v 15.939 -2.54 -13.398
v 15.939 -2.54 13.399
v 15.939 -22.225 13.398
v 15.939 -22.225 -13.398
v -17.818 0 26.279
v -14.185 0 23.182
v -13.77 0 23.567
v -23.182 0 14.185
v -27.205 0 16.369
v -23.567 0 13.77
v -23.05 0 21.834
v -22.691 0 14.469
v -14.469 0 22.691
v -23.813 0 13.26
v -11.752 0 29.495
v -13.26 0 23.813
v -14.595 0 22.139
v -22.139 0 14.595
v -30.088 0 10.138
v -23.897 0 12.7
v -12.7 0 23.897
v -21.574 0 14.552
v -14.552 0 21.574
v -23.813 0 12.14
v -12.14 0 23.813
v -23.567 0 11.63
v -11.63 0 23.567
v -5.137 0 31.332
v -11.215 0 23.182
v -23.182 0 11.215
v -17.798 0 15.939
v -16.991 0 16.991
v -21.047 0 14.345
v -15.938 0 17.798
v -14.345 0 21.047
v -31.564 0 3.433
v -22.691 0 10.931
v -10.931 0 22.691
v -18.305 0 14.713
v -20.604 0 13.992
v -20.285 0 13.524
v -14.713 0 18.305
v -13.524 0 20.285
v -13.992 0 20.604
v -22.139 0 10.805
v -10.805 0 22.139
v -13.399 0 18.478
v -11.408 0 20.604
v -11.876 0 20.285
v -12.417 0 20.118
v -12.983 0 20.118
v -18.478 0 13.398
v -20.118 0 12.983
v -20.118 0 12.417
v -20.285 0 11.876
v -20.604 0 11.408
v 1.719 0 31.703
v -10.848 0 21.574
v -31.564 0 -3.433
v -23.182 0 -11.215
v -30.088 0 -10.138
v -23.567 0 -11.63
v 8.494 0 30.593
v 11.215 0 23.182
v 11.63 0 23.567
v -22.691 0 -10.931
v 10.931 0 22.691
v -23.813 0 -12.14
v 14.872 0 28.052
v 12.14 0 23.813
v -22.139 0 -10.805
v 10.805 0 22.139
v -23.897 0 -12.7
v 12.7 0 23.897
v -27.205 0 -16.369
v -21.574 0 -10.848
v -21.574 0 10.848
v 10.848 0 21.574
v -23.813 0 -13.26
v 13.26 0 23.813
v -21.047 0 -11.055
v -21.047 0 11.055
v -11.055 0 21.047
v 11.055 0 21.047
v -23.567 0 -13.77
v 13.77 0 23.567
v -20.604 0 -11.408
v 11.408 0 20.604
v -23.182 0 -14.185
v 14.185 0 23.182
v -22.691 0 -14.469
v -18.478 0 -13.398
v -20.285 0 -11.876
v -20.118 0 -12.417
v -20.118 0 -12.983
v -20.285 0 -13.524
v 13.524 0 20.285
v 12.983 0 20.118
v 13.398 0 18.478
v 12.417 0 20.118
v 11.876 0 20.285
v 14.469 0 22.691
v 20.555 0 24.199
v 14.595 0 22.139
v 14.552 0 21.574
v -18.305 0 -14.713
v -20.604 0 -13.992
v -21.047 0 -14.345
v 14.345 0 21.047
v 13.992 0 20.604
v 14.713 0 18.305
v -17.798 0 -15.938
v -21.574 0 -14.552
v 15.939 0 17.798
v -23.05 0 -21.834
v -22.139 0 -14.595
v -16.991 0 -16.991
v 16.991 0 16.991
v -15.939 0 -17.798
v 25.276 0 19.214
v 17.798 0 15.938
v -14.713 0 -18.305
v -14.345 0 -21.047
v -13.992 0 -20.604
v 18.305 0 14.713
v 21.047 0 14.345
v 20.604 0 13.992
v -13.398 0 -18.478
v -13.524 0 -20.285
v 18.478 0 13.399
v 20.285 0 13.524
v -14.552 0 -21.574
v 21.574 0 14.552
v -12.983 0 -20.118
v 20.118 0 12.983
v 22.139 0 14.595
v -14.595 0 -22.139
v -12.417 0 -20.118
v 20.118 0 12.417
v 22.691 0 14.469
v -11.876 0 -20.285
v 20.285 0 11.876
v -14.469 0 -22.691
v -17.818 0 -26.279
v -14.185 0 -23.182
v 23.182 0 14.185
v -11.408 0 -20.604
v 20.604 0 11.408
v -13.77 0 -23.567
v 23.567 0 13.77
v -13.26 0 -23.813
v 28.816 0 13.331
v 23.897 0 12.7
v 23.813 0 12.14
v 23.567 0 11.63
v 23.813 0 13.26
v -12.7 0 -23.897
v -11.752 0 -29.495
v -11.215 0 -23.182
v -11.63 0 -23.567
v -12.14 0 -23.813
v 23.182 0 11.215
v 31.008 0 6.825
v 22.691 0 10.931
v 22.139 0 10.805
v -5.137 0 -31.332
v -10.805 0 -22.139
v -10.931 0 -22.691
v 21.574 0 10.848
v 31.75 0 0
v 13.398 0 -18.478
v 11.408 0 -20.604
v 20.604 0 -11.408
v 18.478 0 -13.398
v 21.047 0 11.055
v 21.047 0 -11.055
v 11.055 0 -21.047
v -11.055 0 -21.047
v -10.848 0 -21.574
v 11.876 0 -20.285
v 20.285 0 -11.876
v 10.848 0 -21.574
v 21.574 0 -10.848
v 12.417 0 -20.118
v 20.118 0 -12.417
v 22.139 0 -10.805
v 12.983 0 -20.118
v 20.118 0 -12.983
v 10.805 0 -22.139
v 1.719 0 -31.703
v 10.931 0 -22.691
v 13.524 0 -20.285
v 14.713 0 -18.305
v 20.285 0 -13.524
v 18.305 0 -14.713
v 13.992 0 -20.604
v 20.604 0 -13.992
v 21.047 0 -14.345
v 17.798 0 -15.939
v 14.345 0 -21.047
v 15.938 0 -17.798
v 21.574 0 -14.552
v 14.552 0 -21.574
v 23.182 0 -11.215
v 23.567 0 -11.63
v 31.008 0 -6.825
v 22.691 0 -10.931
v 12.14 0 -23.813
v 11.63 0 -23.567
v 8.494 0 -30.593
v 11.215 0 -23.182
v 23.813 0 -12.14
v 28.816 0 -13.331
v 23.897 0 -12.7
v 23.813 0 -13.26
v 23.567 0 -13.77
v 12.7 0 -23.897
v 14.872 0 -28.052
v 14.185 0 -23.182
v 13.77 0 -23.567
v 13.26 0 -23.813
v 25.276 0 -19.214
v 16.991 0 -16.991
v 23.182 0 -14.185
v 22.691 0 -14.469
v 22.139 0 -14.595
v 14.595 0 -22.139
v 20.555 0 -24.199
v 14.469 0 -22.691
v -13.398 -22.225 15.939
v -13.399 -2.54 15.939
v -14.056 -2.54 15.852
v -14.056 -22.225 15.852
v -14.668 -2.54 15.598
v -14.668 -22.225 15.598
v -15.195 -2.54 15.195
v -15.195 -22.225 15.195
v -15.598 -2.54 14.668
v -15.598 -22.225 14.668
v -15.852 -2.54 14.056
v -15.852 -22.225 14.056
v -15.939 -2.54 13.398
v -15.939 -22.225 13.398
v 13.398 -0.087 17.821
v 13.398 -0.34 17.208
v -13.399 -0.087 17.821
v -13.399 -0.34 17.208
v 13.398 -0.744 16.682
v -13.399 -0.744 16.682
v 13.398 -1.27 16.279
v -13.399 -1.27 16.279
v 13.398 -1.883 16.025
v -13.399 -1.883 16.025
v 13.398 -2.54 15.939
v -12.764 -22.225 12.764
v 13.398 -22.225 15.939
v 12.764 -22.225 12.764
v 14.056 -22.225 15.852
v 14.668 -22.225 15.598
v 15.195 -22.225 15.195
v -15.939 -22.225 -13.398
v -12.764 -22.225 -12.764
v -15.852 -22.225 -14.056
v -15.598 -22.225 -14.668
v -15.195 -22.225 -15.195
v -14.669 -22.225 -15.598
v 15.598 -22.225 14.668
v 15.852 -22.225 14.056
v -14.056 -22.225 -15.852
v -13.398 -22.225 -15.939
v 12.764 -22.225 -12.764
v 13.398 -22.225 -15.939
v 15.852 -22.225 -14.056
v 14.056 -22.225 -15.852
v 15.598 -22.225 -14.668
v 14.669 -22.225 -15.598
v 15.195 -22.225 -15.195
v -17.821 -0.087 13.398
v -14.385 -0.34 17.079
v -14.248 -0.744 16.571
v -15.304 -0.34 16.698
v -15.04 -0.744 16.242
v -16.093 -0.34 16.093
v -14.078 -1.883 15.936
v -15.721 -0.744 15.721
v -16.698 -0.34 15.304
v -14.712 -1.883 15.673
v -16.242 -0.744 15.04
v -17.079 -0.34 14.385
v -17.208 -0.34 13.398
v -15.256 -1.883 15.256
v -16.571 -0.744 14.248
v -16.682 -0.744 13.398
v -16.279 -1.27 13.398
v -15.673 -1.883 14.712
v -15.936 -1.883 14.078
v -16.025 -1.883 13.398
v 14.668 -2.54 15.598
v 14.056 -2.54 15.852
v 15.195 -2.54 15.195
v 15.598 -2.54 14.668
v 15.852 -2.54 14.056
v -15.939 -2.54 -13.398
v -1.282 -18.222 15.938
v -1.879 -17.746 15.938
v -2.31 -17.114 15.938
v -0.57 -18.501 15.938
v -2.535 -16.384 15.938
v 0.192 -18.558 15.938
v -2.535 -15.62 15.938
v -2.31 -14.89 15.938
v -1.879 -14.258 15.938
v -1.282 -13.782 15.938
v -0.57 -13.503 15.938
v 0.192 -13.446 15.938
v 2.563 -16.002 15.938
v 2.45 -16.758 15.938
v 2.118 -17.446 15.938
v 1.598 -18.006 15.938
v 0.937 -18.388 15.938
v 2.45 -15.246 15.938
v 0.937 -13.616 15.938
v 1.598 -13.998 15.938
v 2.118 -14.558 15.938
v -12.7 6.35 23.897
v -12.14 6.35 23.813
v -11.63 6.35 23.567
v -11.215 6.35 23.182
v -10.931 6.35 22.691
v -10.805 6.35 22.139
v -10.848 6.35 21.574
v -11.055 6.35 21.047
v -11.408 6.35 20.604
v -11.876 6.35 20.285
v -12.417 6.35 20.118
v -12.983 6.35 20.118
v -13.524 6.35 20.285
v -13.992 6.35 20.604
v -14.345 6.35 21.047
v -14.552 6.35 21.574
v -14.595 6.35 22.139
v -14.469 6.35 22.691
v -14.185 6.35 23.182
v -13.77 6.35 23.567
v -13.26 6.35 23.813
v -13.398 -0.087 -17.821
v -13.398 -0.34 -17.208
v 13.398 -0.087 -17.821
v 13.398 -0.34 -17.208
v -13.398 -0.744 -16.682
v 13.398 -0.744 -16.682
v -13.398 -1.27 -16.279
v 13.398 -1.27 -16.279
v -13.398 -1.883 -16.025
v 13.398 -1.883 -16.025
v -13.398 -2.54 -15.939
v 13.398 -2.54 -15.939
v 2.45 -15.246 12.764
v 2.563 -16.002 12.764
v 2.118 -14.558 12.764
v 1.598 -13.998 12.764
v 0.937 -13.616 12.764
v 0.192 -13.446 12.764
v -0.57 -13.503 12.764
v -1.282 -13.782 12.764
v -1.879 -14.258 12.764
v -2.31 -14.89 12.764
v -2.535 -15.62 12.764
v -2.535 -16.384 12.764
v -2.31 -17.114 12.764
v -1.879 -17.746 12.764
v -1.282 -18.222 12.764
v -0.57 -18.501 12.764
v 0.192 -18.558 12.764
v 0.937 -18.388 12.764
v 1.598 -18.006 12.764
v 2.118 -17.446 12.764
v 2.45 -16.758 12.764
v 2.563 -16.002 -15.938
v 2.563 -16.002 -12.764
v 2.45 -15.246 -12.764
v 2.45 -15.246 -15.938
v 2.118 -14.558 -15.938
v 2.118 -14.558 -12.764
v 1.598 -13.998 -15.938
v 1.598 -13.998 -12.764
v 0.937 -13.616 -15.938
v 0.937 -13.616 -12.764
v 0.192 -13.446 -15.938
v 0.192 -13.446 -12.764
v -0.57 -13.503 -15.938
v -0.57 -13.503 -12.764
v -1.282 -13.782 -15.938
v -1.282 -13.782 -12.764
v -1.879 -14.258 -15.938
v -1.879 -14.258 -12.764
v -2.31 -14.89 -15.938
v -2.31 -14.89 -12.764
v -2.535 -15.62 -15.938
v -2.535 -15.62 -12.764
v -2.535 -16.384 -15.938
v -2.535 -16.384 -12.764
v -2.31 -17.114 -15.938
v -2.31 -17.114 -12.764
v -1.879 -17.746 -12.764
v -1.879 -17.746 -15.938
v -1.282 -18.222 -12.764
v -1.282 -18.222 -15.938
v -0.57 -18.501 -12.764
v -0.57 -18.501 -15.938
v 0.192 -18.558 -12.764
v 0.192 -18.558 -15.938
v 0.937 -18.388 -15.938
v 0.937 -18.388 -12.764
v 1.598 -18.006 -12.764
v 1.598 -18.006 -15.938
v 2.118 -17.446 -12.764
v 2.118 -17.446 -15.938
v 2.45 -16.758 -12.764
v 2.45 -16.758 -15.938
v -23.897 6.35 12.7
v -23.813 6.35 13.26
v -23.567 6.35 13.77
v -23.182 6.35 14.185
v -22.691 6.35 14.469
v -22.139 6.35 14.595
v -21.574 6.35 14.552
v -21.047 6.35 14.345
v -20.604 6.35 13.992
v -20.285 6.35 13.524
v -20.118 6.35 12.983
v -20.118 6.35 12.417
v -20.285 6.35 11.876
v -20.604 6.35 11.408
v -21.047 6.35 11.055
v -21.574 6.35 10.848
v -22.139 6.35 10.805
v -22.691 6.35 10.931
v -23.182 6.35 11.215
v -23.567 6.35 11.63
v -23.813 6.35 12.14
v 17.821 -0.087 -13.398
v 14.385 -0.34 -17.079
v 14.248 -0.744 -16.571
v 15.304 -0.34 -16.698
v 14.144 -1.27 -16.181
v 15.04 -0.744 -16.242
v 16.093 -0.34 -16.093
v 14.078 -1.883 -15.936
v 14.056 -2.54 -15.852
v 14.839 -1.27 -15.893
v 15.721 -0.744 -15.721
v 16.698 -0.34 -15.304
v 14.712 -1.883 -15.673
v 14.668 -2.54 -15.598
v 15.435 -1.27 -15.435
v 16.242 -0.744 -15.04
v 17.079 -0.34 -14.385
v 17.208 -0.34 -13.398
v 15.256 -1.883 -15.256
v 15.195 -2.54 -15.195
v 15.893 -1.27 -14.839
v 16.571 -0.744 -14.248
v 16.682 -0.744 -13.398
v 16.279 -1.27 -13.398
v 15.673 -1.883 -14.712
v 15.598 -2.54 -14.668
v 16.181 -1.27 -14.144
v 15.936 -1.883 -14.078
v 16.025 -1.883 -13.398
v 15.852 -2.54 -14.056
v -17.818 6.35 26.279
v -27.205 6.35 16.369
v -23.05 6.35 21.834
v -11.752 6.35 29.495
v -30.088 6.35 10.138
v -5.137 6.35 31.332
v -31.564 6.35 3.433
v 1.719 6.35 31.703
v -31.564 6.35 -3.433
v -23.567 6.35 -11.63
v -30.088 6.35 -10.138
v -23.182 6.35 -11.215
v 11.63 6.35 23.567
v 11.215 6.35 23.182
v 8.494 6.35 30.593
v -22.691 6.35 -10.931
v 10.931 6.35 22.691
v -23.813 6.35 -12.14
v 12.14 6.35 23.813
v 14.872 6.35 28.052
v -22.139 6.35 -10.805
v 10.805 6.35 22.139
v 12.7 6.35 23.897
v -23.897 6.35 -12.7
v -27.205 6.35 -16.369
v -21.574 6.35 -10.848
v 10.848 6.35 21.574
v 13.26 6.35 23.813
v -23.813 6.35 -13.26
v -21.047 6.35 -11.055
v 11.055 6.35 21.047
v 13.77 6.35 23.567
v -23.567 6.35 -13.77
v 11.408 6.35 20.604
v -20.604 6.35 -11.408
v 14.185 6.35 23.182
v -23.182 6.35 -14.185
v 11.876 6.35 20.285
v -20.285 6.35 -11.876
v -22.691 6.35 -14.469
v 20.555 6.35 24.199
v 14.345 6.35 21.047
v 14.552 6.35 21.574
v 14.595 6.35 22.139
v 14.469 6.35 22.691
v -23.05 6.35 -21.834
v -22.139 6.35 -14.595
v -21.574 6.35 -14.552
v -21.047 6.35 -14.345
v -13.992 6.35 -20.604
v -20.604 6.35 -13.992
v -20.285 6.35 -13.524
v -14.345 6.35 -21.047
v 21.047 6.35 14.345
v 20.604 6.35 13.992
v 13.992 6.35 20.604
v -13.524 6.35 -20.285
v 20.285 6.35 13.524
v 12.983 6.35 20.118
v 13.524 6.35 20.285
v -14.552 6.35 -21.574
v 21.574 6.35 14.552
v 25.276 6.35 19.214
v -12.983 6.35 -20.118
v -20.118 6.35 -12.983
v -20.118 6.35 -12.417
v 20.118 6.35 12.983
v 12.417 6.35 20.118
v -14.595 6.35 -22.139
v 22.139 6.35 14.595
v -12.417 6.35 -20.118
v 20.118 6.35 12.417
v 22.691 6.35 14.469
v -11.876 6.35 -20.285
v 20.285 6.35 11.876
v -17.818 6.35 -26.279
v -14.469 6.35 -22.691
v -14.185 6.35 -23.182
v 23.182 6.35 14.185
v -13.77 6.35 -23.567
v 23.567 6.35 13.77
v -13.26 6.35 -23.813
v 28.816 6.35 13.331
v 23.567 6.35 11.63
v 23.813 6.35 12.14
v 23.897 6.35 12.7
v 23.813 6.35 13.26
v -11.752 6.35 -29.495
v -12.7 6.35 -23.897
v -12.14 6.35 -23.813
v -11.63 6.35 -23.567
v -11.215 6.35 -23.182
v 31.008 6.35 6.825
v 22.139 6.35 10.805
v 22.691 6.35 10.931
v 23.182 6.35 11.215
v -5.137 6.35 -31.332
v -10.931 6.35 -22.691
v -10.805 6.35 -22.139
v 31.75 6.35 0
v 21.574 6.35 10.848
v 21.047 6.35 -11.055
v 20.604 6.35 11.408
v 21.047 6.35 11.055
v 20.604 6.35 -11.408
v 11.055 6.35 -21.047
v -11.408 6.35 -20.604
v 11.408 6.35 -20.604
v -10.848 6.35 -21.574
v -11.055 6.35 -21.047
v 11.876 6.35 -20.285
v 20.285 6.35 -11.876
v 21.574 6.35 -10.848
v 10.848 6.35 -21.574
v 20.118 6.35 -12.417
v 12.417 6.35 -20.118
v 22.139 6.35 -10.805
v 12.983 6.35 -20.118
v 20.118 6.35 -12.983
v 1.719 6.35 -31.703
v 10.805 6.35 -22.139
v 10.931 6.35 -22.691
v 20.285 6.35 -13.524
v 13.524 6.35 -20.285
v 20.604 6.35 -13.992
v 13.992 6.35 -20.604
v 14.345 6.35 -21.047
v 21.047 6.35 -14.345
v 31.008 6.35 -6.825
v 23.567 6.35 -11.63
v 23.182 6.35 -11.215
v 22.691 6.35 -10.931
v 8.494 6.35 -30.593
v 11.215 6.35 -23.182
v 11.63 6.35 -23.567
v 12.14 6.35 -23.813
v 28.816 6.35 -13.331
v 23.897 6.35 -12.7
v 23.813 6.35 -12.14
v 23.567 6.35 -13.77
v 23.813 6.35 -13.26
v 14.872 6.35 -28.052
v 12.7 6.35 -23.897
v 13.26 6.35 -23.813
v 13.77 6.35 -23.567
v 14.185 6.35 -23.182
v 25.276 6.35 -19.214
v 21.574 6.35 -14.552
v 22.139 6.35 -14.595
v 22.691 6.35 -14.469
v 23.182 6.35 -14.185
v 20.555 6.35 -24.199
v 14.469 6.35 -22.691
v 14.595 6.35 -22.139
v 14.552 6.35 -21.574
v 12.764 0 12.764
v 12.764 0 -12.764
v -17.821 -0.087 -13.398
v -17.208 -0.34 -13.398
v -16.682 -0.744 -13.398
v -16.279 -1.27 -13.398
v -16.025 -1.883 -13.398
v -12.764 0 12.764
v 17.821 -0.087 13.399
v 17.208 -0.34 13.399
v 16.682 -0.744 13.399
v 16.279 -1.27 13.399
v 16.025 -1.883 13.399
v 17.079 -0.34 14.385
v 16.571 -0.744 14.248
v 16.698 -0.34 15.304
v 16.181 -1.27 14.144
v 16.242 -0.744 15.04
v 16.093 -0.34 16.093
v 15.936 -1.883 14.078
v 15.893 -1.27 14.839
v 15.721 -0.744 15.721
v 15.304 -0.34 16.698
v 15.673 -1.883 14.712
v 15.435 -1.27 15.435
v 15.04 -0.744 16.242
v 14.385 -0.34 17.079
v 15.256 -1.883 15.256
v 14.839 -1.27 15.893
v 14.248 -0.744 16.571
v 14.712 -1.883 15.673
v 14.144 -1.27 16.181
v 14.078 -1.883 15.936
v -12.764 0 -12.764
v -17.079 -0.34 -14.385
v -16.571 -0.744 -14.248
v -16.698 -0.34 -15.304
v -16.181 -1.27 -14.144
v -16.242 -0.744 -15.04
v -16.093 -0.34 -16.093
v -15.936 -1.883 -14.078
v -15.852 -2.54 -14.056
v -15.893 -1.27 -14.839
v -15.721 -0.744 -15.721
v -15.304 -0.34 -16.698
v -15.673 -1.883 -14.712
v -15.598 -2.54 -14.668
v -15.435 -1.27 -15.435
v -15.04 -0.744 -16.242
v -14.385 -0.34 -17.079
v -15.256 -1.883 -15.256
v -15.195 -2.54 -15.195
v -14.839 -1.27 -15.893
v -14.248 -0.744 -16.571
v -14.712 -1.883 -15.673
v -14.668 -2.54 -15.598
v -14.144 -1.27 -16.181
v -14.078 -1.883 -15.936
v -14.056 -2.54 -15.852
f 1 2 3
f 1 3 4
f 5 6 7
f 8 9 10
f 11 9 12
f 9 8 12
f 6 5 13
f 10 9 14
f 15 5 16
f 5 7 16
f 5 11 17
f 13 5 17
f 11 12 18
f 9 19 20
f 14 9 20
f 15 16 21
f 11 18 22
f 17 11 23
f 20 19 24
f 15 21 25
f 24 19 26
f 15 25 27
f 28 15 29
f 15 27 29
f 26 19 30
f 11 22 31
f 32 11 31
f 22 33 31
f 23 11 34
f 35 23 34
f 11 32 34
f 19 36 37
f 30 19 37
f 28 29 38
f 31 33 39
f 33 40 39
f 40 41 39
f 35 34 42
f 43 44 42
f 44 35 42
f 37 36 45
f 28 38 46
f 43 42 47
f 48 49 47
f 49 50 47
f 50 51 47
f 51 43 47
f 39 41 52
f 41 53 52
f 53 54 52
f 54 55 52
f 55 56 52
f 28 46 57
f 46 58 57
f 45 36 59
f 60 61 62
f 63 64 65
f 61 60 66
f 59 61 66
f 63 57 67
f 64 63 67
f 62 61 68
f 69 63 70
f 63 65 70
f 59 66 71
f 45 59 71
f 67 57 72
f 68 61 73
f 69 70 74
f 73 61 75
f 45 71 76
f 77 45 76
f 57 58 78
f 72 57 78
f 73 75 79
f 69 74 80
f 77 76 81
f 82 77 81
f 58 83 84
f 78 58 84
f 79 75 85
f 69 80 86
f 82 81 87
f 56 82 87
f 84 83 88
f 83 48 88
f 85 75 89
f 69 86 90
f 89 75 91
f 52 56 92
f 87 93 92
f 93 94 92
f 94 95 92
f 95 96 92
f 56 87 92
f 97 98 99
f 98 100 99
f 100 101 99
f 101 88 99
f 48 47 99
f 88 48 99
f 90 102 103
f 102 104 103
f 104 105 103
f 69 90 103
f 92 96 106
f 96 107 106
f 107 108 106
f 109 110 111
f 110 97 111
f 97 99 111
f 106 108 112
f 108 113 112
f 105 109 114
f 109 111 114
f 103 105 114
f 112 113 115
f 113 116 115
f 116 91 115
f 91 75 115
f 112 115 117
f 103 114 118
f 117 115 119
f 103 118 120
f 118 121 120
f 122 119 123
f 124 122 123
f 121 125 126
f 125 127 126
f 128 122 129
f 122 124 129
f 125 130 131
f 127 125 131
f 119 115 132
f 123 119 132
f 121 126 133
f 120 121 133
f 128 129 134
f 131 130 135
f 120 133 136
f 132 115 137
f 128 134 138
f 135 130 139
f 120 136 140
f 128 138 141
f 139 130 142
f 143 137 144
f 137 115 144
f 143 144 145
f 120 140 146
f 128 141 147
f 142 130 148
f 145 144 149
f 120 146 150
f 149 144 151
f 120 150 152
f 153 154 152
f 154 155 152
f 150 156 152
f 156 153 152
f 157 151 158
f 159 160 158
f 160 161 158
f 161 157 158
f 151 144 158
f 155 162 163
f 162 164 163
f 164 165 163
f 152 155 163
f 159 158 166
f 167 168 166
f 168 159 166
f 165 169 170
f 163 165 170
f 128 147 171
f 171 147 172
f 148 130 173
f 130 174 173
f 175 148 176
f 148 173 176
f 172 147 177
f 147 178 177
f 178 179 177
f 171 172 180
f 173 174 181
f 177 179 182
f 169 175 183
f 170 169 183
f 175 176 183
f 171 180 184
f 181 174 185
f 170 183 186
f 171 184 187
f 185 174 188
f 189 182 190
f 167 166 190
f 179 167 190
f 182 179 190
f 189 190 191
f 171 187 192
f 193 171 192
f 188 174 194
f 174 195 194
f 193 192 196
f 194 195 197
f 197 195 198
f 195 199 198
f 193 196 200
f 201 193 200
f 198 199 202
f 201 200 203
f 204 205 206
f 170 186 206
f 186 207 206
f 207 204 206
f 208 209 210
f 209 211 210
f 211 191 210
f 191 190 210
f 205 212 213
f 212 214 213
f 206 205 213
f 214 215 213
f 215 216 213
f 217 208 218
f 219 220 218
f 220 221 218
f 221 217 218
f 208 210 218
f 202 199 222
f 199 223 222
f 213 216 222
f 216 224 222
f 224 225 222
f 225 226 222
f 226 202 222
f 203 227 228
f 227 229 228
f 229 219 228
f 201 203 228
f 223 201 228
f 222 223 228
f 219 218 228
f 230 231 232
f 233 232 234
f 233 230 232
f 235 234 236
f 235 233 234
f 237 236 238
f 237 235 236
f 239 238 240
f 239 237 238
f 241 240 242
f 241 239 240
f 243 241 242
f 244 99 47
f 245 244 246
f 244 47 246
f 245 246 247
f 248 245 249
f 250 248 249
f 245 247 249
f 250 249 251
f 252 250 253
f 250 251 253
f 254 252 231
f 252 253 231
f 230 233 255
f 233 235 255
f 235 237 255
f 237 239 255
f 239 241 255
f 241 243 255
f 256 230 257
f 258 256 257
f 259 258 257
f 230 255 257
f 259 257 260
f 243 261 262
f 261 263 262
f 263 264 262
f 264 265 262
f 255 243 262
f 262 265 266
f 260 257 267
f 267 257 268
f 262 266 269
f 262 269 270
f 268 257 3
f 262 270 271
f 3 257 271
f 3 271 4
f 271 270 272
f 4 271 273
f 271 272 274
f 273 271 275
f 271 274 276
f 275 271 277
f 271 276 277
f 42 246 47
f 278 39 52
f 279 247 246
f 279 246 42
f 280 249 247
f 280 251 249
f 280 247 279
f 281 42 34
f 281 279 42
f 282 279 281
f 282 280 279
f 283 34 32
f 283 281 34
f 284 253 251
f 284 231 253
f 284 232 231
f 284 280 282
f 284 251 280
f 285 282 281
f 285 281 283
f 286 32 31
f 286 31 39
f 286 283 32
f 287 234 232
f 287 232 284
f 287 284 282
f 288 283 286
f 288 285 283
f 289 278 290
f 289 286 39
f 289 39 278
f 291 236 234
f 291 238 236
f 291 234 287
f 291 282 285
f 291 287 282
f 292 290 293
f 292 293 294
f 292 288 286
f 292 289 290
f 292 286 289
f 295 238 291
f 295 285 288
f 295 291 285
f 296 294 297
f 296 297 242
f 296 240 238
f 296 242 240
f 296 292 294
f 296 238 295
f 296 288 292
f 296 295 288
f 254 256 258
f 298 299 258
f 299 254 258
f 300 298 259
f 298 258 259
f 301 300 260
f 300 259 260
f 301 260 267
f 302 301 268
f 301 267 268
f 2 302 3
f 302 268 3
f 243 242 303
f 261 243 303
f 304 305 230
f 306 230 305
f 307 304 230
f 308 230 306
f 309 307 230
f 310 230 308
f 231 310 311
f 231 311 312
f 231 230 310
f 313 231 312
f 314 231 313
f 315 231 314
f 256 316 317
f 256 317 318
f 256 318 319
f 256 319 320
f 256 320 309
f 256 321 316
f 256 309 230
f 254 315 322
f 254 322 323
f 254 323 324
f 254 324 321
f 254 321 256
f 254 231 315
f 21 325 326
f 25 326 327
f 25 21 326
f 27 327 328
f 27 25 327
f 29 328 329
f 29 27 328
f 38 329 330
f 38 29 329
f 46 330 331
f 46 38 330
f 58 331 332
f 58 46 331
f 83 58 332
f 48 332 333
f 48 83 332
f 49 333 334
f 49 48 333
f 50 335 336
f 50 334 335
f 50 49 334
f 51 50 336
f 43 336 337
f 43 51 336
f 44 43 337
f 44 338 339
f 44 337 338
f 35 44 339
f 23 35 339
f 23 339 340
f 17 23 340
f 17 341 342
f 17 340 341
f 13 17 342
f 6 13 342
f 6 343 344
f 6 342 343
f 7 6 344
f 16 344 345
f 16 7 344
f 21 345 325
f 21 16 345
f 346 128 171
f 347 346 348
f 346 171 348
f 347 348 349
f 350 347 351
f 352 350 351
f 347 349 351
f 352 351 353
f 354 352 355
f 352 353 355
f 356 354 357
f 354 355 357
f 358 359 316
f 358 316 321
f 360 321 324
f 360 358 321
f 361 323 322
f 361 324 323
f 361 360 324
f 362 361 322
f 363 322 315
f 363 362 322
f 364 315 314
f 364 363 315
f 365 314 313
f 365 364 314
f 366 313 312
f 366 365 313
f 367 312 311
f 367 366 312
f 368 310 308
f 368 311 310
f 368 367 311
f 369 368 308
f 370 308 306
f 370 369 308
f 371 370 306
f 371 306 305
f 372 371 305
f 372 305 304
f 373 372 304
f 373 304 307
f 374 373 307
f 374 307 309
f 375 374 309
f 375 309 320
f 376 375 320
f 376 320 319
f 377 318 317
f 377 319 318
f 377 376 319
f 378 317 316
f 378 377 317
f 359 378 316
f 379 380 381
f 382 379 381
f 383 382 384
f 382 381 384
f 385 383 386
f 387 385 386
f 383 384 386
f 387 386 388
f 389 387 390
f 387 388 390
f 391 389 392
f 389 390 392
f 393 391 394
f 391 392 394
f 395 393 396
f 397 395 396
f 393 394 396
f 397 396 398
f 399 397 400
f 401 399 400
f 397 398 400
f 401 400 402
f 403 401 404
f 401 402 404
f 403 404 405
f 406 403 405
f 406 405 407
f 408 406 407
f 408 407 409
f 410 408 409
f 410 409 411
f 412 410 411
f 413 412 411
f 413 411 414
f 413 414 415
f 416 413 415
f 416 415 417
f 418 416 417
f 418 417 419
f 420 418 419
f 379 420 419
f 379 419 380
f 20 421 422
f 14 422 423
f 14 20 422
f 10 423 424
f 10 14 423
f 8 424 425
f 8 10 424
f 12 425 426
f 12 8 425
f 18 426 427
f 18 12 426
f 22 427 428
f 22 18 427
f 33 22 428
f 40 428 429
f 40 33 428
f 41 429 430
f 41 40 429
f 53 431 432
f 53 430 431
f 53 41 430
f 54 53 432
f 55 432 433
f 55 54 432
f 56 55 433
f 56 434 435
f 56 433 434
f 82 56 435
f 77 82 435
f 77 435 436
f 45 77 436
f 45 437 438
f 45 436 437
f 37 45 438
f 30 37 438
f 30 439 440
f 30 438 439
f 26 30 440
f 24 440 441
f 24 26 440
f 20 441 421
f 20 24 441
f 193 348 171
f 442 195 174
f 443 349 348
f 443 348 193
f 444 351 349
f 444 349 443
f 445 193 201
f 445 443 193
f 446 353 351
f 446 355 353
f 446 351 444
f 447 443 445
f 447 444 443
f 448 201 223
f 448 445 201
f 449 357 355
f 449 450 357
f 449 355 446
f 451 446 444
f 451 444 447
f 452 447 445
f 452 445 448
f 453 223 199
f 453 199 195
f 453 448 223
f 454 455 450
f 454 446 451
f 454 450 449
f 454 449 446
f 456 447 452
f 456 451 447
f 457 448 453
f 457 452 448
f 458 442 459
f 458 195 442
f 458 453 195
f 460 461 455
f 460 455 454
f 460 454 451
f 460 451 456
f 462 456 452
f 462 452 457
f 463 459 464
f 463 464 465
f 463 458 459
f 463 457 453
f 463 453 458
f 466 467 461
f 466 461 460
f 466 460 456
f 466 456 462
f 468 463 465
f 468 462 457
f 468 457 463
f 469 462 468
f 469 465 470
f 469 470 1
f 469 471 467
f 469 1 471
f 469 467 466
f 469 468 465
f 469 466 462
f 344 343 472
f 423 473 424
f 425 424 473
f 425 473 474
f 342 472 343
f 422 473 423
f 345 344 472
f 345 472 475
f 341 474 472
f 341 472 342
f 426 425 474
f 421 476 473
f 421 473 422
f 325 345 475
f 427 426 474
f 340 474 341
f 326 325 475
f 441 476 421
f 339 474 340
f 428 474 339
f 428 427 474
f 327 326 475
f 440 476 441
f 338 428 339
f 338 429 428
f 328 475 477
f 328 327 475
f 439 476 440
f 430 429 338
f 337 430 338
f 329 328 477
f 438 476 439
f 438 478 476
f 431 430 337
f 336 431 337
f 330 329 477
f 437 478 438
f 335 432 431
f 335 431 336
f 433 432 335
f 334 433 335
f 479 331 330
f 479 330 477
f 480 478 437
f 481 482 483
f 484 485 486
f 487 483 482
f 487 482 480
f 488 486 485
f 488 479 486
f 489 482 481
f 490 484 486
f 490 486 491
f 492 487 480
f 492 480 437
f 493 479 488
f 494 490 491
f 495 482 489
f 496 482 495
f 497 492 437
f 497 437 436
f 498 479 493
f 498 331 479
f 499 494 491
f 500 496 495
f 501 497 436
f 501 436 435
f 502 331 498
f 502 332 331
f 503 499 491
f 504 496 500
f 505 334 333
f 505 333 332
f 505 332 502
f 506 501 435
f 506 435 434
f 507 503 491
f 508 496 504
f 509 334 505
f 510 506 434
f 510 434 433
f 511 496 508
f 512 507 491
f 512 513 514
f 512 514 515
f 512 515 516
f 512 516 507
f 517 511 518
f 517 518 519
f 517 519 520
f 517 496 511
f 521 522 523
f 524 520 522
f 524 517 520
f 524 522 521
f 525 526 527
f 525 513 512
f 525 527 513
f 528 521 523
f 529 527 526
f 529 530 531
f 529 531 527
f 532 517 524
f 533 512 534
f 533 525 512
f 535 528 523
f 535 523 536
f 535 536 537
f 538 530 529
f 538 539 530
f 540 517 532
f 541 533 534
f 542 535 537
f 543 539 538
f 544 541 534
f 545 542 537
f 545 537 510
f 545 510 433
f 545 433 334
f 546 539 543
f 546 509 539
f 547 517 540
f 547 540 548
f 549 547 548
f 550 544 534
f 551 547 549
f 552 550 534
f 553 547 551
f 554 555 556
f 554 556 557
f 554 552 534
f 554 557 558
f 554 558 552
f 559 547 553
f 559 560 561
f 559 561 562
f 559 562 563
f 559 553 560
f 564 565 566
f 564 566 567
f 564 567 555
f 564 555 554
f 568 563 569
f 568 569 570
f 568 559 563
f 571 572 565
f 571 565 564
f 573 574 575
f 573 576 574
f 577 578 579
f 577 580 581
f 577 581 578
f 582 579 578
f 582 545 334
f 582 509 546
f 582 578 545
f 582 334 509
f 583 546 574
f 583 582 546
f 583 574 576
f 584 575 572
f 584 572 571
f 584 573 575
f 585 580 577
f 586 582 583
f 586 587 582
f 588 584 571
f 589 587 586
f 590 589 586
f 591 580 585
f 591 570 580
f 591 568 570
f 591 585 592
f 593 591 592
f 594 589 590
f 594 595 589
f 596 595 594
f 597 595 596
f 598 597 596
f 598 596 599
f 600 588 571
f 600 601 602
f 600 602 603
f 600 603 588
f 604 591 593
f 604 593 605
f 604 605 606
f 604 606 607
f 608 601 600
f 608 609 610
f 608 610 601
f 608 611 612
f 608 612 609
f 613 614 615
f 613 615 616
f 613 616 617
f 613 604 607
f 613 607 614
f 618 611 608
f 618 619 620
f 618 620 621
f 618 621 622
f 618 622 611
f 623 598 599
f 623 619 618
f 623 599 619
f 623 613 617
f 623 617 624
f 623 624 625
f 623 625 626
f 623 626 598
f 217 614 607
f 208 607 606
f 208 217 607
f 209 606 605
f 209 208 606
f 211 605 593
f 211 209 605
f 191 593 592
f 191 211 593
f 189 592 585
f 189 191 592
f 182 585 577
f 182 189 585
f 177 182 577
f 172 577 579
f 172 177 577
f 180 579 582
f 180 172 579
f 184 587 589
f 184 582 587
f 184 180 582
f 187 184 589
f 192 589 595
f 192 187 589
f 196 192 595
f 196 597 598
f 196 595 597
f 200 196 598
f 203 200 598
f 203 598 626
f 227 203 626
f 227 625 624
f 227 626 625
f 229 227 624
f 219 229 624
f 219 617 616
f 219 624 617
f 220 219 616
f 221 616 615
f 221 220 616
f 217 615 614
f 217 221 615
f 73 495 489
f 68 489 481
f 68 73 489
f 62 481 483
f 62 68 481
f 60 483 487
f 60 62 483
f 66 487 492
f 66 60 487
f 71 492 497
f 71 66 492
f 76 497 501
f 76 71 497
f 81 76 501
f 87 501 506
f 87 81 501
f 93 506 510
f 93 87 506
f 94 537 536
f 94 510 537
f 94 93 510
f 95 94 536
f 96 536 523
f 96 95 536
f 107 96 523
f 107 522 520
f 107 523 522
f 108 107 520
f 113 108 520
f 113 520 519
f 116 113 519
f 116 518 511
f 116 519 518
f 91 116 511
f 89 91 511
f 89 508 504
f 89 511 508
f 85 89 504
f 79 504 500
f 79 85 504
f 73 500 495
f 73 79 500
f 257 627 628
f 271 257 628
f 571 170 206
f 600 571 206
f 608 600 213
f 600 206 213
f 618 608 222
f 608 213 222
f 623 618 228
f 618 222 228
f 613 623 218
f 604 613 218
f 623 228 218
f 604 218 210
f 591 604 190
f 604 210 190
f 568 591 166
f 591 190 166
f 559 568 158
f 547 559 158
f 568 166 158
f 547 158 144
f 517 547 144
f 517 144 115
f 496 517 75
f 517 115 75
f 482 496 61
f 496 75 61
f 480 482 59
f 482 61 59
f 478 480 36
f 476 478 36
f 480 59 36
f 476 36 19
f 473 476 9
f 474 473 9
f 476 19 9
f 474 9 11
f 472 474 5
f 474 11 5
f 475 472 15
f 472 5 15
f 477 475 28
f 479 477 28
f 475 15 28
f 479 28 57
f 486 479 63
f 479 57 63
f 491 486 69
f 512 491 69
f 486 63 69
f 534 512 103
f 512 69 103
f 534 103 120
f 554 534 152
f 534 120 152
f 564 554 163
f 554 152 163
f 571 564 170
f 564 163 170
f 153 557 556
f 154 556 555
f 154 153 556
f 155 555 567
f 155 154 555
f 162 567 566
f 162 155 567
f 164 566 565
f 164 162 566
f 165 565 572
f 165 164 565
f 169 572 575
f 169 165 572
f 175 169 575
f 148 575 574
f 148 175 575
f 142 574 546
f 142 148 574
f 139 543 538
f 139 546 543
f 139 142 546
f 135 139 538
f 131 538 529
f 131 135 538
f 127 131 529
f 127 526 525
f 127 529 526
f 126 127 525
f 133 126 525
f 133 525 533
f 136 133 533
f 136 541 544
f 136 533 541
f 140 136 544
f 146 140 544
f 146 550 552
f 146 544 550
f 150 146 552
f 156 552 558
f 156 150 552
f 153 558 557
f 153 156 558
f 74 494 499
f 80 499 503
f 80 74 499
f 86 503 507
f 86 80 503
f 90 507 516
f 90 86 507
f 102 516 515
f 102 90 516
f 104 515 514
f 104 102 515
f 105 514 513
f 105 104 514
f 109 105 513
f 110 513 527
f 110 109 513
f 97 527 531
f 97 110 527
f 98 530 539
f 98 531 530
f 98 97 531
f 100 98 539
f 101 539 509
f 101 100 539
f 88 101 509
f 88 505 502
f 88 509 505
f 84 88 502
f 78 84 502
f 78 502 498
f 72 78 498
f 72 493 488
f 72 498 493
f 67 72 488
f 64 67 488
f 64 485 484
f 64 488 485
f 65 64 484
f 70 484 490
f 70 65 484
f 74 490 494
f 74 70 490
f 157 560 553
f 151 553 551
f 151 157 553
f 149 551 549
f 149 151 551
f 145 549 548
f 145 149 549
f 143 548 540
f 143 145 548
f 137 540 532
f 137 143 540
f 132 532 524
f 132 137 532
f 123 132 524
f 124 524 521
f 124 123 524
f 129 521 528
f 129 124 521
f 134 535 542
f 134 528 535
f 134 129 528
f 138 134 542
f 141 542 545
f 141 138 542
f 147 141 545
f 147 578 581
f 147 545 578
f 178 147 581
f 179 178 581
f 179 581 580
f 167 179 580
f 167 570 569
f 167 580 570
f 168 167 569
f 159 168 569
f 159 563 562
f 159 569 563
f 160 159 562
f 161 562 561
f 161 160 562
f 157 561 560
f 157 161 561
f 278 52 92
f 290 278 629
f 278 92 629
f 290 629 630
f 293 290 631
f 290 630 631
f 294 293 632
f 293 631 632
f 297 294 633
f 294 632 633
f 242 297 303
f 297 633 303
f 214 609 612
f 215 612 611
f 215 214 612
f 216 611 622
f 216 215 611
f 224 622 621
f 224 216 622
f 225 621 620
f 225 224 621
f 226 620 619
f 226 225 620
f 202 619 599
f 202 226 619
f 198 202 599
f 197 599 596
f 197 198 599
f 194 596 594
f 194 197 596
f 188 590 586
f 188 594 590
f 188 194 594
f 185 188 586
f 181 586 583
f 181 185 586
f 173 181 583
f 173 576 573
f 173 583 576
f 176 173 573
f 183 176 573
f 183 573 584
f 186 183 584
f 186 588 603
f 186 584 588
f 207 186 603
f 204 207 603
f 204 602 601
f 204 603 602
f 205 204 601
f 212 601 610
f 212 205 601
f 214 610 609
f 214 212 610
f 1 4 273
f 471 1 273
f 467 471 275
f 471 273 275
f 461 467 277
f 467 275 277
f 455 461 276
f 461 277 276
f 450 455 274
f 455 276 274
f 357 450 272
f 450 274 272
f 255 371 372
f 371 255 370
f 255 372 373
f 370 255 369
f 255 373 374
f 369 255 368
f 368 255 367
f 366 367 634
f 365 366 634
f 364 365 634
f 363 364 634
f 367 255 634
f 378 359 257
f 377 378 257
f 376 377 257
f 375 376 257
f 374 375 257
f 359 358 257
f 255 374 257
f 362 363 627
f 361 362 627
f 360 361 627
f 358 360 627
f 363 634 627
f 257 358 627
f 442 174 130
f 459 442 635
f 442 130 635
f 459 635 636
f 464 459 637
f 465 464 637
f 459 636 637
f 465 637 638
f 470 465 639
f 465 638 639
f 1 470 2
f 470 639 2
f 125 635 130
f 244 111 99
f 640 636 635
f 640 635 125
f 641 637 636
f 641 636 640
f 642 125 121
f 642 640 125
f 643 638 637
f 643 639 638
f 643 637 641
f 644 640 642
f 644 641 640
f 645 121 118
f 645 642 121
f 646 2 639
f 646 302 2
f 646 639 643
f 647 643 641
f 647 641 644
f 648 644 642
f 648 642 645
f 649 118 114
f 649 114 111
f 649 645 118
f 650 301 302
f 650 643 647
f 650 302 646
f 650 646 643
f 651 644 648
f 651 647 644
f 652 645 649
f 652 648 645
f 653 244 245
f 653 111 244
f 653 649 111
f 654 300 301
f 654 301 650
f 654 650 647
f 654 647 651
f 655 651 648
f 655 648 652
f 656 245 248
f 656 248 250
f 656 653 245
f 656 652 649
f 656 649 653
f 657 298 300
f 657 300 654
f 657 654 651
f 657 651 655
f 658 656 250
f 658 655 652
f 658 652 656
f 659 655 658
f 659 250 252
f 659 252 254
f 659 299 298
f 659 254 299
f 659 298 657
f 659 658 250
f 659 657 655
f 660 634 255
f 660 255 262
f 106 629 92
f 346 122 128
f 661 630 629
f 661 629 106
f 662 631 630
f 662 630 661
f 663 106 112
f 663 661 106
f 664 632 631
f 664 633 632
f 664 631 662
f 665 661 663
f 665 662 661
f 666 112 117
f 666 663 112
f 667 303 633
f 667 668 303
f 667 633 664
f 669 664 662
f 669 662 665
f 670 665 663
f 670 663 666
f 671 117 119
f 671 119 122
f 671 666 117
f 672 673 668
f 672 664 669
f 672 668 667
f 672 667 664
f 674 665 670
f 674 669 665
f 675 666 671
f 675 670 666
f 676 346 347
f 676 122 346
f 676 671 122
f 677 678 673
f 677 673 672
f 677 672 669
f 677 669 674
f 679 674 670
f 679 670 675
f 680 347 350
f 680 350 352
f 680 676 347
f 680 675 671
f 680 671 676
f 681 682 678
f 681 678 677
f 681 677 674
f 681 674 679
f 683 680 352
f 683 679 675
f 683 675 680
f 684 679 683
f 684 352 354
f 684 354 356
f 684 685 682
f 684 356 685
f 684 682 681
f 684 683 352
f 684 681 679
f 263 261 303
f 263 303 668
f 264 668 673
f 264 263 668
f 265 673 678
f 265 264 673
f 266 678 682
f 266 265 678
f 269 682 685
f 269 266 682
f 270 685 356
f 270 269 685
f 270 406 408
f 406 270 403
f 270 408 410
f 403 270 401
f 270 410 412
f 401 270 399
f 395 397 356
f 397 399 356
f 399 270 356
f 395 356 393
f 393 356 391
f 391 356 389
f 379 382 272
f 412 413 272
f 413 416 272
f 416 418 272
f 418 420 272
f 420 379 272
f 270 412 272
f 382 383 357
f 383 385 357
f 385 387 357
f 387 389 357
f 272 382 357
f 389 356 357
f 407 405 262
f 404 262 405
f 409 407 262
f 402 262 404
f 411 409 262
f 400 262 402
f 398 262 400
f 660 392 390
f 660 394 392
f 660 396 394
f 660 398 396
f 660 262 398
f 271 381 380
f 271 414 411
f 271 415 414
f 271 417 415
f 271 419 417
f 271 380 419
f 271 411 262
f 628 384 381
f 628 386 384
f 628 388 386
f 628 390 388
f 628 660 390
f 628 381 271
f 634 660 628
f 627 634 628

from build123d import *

# Parameters (mm, degrees)
SKETCH2_R               = 31.75
BOSS_EXTRUDE1_DEPTH     = 6.35
SKETCH3_W               = 31.877
SKETCH3_H               = 31.877
BOSS_EXTRUDE2_DEPTH     = 22.225
SKETCH4_W               = 25.527
SKETCH4_H               = 25.527
CUT_EXTRUDE1_DEPTH      = 23.225
SKETCH5_R               = 1.90000001
CUT_EXTRUDE2_DEPTH      = 7.35
SKETCH7_R               = 2.563499953
CUT_EXTRUDE3_DEPTH      = 32.75
CUT_EXTRUDE3_DEPTH_BACK = 32.75
CIRPATTERN2_COUNT       = 4
FILLET2_R               = 2.54
FILLET3_R               = 2.54


with BuildPart() as part:
    # Sketch2 → Boss-Extrude1 (new body)
    with BuildSketch(Plane(origin=(0, 0, 0), x_dir=(1, 0, 0), z_dir=(0, 1, 0))):
        Circle(SKETCH2_R)
    extrude(amount=BOSS_EXTRUDE1_DEPTH)

    # Sketch3 → Boss-Extrude2 (add)
    with BuildSketch(Plane(origin=(0, 0, 0), x_dir=(1, 0, 0), z_dir=(0, 1, 0))):
        Rectangle(SKETCH3_W, SKETCH3_H)
    extrude(amount=-BOSS_EXTRUDE2_DEPTH)

    # Sketch4 → Cut-Extrude1 (cut, through all)
    with BuildSketch(Plane(origin=(0, 0, 0), x_dir=(1, 0, 0), z_dir=(0, 1, 0))):
        Rectangle(SKETCH4_W, SKETCH4_H)
    extrude(amount=-CUT_EXTRUDE1_DEPTH, mode=Mode.SUBTRACT)

    # Sketch5 → Cut-Extrude2 (cut, through all)
    with BuildSketch(Plane(origin=(0, 0, 0), x_dir=(1, 0, 0), z_dir=(0, 1, 0))):
        with Locations((21.997045256, 12.7)):
            Circle(SKETCH5_R)
        with Locations((21.997045256, -12.7)):
            Circle(SKETCH5_R)
    cut_extrude2 = extrude(amount=CUT_EXTRUDE2_DEPTH, mode=Mode.SUBTRACT)

    # Sketch7 → Cut-Extrude3 (cut, two sides)
    with BuildSketch(Plane.XY) as cut_extrude3_sk:
        with Locations((0, -16.002)):
            Circle(SKETCH7_R)
    extrude(amount=CUT_EXTRUDE3_DEPTH, mode=Mode.SUBTRACT)
    extrude(cut_extrude3_sk.sketch, amount=-CUT_EXTRUDE3_DEPTH_BACK, mode=Mode.SUBTRACT)

    # CirPattern2: Cut-Extrude2 ×4 about axis
    cirpattern2_axis = Axis((0, 0, 0), (0, 1, 0))
    for i in range(1, CIRPATTERN2_COUNT):
        add(cut_extrude2.rotate(cirpattern2_axis, i * 360 / CIRPATTERN2_COUNT), mode=Mode.SUBTRACT)

    # Fillet2
    fillet2_edges = [part.edges().sort_by_distance(p)[0] for p in [
        (-15.9385, -11.1125, -15.9385),
        (15.9385, -11.1125, -15.9385),
        (15.9385, -11.1125, 15.9385),
        (-15.9385, -11.1125, 15.9385),
    ]]
    fillet(fillet2_edges, radius=FILLET2_R)

    # Fillet3
    fillet3_edges = [part.edges().sort_by_distance(p)[0] for p in [
        (-15.9385, 0, 0),
        (0, 0, 15.9385),
        (15.9385, 0, 0),
        (0, 0, -15.9385),
        (-15.194551224, 0, 15.194551224),
        (15.194551224, 0, 15.194551224),
        (15.194551224, 0, -15.194551224),
        (-15.194551224, 0, -15.194551224),
    ]]
    fillet(fillet3_edges, radius=FILLET3_R)


solid = part.part
